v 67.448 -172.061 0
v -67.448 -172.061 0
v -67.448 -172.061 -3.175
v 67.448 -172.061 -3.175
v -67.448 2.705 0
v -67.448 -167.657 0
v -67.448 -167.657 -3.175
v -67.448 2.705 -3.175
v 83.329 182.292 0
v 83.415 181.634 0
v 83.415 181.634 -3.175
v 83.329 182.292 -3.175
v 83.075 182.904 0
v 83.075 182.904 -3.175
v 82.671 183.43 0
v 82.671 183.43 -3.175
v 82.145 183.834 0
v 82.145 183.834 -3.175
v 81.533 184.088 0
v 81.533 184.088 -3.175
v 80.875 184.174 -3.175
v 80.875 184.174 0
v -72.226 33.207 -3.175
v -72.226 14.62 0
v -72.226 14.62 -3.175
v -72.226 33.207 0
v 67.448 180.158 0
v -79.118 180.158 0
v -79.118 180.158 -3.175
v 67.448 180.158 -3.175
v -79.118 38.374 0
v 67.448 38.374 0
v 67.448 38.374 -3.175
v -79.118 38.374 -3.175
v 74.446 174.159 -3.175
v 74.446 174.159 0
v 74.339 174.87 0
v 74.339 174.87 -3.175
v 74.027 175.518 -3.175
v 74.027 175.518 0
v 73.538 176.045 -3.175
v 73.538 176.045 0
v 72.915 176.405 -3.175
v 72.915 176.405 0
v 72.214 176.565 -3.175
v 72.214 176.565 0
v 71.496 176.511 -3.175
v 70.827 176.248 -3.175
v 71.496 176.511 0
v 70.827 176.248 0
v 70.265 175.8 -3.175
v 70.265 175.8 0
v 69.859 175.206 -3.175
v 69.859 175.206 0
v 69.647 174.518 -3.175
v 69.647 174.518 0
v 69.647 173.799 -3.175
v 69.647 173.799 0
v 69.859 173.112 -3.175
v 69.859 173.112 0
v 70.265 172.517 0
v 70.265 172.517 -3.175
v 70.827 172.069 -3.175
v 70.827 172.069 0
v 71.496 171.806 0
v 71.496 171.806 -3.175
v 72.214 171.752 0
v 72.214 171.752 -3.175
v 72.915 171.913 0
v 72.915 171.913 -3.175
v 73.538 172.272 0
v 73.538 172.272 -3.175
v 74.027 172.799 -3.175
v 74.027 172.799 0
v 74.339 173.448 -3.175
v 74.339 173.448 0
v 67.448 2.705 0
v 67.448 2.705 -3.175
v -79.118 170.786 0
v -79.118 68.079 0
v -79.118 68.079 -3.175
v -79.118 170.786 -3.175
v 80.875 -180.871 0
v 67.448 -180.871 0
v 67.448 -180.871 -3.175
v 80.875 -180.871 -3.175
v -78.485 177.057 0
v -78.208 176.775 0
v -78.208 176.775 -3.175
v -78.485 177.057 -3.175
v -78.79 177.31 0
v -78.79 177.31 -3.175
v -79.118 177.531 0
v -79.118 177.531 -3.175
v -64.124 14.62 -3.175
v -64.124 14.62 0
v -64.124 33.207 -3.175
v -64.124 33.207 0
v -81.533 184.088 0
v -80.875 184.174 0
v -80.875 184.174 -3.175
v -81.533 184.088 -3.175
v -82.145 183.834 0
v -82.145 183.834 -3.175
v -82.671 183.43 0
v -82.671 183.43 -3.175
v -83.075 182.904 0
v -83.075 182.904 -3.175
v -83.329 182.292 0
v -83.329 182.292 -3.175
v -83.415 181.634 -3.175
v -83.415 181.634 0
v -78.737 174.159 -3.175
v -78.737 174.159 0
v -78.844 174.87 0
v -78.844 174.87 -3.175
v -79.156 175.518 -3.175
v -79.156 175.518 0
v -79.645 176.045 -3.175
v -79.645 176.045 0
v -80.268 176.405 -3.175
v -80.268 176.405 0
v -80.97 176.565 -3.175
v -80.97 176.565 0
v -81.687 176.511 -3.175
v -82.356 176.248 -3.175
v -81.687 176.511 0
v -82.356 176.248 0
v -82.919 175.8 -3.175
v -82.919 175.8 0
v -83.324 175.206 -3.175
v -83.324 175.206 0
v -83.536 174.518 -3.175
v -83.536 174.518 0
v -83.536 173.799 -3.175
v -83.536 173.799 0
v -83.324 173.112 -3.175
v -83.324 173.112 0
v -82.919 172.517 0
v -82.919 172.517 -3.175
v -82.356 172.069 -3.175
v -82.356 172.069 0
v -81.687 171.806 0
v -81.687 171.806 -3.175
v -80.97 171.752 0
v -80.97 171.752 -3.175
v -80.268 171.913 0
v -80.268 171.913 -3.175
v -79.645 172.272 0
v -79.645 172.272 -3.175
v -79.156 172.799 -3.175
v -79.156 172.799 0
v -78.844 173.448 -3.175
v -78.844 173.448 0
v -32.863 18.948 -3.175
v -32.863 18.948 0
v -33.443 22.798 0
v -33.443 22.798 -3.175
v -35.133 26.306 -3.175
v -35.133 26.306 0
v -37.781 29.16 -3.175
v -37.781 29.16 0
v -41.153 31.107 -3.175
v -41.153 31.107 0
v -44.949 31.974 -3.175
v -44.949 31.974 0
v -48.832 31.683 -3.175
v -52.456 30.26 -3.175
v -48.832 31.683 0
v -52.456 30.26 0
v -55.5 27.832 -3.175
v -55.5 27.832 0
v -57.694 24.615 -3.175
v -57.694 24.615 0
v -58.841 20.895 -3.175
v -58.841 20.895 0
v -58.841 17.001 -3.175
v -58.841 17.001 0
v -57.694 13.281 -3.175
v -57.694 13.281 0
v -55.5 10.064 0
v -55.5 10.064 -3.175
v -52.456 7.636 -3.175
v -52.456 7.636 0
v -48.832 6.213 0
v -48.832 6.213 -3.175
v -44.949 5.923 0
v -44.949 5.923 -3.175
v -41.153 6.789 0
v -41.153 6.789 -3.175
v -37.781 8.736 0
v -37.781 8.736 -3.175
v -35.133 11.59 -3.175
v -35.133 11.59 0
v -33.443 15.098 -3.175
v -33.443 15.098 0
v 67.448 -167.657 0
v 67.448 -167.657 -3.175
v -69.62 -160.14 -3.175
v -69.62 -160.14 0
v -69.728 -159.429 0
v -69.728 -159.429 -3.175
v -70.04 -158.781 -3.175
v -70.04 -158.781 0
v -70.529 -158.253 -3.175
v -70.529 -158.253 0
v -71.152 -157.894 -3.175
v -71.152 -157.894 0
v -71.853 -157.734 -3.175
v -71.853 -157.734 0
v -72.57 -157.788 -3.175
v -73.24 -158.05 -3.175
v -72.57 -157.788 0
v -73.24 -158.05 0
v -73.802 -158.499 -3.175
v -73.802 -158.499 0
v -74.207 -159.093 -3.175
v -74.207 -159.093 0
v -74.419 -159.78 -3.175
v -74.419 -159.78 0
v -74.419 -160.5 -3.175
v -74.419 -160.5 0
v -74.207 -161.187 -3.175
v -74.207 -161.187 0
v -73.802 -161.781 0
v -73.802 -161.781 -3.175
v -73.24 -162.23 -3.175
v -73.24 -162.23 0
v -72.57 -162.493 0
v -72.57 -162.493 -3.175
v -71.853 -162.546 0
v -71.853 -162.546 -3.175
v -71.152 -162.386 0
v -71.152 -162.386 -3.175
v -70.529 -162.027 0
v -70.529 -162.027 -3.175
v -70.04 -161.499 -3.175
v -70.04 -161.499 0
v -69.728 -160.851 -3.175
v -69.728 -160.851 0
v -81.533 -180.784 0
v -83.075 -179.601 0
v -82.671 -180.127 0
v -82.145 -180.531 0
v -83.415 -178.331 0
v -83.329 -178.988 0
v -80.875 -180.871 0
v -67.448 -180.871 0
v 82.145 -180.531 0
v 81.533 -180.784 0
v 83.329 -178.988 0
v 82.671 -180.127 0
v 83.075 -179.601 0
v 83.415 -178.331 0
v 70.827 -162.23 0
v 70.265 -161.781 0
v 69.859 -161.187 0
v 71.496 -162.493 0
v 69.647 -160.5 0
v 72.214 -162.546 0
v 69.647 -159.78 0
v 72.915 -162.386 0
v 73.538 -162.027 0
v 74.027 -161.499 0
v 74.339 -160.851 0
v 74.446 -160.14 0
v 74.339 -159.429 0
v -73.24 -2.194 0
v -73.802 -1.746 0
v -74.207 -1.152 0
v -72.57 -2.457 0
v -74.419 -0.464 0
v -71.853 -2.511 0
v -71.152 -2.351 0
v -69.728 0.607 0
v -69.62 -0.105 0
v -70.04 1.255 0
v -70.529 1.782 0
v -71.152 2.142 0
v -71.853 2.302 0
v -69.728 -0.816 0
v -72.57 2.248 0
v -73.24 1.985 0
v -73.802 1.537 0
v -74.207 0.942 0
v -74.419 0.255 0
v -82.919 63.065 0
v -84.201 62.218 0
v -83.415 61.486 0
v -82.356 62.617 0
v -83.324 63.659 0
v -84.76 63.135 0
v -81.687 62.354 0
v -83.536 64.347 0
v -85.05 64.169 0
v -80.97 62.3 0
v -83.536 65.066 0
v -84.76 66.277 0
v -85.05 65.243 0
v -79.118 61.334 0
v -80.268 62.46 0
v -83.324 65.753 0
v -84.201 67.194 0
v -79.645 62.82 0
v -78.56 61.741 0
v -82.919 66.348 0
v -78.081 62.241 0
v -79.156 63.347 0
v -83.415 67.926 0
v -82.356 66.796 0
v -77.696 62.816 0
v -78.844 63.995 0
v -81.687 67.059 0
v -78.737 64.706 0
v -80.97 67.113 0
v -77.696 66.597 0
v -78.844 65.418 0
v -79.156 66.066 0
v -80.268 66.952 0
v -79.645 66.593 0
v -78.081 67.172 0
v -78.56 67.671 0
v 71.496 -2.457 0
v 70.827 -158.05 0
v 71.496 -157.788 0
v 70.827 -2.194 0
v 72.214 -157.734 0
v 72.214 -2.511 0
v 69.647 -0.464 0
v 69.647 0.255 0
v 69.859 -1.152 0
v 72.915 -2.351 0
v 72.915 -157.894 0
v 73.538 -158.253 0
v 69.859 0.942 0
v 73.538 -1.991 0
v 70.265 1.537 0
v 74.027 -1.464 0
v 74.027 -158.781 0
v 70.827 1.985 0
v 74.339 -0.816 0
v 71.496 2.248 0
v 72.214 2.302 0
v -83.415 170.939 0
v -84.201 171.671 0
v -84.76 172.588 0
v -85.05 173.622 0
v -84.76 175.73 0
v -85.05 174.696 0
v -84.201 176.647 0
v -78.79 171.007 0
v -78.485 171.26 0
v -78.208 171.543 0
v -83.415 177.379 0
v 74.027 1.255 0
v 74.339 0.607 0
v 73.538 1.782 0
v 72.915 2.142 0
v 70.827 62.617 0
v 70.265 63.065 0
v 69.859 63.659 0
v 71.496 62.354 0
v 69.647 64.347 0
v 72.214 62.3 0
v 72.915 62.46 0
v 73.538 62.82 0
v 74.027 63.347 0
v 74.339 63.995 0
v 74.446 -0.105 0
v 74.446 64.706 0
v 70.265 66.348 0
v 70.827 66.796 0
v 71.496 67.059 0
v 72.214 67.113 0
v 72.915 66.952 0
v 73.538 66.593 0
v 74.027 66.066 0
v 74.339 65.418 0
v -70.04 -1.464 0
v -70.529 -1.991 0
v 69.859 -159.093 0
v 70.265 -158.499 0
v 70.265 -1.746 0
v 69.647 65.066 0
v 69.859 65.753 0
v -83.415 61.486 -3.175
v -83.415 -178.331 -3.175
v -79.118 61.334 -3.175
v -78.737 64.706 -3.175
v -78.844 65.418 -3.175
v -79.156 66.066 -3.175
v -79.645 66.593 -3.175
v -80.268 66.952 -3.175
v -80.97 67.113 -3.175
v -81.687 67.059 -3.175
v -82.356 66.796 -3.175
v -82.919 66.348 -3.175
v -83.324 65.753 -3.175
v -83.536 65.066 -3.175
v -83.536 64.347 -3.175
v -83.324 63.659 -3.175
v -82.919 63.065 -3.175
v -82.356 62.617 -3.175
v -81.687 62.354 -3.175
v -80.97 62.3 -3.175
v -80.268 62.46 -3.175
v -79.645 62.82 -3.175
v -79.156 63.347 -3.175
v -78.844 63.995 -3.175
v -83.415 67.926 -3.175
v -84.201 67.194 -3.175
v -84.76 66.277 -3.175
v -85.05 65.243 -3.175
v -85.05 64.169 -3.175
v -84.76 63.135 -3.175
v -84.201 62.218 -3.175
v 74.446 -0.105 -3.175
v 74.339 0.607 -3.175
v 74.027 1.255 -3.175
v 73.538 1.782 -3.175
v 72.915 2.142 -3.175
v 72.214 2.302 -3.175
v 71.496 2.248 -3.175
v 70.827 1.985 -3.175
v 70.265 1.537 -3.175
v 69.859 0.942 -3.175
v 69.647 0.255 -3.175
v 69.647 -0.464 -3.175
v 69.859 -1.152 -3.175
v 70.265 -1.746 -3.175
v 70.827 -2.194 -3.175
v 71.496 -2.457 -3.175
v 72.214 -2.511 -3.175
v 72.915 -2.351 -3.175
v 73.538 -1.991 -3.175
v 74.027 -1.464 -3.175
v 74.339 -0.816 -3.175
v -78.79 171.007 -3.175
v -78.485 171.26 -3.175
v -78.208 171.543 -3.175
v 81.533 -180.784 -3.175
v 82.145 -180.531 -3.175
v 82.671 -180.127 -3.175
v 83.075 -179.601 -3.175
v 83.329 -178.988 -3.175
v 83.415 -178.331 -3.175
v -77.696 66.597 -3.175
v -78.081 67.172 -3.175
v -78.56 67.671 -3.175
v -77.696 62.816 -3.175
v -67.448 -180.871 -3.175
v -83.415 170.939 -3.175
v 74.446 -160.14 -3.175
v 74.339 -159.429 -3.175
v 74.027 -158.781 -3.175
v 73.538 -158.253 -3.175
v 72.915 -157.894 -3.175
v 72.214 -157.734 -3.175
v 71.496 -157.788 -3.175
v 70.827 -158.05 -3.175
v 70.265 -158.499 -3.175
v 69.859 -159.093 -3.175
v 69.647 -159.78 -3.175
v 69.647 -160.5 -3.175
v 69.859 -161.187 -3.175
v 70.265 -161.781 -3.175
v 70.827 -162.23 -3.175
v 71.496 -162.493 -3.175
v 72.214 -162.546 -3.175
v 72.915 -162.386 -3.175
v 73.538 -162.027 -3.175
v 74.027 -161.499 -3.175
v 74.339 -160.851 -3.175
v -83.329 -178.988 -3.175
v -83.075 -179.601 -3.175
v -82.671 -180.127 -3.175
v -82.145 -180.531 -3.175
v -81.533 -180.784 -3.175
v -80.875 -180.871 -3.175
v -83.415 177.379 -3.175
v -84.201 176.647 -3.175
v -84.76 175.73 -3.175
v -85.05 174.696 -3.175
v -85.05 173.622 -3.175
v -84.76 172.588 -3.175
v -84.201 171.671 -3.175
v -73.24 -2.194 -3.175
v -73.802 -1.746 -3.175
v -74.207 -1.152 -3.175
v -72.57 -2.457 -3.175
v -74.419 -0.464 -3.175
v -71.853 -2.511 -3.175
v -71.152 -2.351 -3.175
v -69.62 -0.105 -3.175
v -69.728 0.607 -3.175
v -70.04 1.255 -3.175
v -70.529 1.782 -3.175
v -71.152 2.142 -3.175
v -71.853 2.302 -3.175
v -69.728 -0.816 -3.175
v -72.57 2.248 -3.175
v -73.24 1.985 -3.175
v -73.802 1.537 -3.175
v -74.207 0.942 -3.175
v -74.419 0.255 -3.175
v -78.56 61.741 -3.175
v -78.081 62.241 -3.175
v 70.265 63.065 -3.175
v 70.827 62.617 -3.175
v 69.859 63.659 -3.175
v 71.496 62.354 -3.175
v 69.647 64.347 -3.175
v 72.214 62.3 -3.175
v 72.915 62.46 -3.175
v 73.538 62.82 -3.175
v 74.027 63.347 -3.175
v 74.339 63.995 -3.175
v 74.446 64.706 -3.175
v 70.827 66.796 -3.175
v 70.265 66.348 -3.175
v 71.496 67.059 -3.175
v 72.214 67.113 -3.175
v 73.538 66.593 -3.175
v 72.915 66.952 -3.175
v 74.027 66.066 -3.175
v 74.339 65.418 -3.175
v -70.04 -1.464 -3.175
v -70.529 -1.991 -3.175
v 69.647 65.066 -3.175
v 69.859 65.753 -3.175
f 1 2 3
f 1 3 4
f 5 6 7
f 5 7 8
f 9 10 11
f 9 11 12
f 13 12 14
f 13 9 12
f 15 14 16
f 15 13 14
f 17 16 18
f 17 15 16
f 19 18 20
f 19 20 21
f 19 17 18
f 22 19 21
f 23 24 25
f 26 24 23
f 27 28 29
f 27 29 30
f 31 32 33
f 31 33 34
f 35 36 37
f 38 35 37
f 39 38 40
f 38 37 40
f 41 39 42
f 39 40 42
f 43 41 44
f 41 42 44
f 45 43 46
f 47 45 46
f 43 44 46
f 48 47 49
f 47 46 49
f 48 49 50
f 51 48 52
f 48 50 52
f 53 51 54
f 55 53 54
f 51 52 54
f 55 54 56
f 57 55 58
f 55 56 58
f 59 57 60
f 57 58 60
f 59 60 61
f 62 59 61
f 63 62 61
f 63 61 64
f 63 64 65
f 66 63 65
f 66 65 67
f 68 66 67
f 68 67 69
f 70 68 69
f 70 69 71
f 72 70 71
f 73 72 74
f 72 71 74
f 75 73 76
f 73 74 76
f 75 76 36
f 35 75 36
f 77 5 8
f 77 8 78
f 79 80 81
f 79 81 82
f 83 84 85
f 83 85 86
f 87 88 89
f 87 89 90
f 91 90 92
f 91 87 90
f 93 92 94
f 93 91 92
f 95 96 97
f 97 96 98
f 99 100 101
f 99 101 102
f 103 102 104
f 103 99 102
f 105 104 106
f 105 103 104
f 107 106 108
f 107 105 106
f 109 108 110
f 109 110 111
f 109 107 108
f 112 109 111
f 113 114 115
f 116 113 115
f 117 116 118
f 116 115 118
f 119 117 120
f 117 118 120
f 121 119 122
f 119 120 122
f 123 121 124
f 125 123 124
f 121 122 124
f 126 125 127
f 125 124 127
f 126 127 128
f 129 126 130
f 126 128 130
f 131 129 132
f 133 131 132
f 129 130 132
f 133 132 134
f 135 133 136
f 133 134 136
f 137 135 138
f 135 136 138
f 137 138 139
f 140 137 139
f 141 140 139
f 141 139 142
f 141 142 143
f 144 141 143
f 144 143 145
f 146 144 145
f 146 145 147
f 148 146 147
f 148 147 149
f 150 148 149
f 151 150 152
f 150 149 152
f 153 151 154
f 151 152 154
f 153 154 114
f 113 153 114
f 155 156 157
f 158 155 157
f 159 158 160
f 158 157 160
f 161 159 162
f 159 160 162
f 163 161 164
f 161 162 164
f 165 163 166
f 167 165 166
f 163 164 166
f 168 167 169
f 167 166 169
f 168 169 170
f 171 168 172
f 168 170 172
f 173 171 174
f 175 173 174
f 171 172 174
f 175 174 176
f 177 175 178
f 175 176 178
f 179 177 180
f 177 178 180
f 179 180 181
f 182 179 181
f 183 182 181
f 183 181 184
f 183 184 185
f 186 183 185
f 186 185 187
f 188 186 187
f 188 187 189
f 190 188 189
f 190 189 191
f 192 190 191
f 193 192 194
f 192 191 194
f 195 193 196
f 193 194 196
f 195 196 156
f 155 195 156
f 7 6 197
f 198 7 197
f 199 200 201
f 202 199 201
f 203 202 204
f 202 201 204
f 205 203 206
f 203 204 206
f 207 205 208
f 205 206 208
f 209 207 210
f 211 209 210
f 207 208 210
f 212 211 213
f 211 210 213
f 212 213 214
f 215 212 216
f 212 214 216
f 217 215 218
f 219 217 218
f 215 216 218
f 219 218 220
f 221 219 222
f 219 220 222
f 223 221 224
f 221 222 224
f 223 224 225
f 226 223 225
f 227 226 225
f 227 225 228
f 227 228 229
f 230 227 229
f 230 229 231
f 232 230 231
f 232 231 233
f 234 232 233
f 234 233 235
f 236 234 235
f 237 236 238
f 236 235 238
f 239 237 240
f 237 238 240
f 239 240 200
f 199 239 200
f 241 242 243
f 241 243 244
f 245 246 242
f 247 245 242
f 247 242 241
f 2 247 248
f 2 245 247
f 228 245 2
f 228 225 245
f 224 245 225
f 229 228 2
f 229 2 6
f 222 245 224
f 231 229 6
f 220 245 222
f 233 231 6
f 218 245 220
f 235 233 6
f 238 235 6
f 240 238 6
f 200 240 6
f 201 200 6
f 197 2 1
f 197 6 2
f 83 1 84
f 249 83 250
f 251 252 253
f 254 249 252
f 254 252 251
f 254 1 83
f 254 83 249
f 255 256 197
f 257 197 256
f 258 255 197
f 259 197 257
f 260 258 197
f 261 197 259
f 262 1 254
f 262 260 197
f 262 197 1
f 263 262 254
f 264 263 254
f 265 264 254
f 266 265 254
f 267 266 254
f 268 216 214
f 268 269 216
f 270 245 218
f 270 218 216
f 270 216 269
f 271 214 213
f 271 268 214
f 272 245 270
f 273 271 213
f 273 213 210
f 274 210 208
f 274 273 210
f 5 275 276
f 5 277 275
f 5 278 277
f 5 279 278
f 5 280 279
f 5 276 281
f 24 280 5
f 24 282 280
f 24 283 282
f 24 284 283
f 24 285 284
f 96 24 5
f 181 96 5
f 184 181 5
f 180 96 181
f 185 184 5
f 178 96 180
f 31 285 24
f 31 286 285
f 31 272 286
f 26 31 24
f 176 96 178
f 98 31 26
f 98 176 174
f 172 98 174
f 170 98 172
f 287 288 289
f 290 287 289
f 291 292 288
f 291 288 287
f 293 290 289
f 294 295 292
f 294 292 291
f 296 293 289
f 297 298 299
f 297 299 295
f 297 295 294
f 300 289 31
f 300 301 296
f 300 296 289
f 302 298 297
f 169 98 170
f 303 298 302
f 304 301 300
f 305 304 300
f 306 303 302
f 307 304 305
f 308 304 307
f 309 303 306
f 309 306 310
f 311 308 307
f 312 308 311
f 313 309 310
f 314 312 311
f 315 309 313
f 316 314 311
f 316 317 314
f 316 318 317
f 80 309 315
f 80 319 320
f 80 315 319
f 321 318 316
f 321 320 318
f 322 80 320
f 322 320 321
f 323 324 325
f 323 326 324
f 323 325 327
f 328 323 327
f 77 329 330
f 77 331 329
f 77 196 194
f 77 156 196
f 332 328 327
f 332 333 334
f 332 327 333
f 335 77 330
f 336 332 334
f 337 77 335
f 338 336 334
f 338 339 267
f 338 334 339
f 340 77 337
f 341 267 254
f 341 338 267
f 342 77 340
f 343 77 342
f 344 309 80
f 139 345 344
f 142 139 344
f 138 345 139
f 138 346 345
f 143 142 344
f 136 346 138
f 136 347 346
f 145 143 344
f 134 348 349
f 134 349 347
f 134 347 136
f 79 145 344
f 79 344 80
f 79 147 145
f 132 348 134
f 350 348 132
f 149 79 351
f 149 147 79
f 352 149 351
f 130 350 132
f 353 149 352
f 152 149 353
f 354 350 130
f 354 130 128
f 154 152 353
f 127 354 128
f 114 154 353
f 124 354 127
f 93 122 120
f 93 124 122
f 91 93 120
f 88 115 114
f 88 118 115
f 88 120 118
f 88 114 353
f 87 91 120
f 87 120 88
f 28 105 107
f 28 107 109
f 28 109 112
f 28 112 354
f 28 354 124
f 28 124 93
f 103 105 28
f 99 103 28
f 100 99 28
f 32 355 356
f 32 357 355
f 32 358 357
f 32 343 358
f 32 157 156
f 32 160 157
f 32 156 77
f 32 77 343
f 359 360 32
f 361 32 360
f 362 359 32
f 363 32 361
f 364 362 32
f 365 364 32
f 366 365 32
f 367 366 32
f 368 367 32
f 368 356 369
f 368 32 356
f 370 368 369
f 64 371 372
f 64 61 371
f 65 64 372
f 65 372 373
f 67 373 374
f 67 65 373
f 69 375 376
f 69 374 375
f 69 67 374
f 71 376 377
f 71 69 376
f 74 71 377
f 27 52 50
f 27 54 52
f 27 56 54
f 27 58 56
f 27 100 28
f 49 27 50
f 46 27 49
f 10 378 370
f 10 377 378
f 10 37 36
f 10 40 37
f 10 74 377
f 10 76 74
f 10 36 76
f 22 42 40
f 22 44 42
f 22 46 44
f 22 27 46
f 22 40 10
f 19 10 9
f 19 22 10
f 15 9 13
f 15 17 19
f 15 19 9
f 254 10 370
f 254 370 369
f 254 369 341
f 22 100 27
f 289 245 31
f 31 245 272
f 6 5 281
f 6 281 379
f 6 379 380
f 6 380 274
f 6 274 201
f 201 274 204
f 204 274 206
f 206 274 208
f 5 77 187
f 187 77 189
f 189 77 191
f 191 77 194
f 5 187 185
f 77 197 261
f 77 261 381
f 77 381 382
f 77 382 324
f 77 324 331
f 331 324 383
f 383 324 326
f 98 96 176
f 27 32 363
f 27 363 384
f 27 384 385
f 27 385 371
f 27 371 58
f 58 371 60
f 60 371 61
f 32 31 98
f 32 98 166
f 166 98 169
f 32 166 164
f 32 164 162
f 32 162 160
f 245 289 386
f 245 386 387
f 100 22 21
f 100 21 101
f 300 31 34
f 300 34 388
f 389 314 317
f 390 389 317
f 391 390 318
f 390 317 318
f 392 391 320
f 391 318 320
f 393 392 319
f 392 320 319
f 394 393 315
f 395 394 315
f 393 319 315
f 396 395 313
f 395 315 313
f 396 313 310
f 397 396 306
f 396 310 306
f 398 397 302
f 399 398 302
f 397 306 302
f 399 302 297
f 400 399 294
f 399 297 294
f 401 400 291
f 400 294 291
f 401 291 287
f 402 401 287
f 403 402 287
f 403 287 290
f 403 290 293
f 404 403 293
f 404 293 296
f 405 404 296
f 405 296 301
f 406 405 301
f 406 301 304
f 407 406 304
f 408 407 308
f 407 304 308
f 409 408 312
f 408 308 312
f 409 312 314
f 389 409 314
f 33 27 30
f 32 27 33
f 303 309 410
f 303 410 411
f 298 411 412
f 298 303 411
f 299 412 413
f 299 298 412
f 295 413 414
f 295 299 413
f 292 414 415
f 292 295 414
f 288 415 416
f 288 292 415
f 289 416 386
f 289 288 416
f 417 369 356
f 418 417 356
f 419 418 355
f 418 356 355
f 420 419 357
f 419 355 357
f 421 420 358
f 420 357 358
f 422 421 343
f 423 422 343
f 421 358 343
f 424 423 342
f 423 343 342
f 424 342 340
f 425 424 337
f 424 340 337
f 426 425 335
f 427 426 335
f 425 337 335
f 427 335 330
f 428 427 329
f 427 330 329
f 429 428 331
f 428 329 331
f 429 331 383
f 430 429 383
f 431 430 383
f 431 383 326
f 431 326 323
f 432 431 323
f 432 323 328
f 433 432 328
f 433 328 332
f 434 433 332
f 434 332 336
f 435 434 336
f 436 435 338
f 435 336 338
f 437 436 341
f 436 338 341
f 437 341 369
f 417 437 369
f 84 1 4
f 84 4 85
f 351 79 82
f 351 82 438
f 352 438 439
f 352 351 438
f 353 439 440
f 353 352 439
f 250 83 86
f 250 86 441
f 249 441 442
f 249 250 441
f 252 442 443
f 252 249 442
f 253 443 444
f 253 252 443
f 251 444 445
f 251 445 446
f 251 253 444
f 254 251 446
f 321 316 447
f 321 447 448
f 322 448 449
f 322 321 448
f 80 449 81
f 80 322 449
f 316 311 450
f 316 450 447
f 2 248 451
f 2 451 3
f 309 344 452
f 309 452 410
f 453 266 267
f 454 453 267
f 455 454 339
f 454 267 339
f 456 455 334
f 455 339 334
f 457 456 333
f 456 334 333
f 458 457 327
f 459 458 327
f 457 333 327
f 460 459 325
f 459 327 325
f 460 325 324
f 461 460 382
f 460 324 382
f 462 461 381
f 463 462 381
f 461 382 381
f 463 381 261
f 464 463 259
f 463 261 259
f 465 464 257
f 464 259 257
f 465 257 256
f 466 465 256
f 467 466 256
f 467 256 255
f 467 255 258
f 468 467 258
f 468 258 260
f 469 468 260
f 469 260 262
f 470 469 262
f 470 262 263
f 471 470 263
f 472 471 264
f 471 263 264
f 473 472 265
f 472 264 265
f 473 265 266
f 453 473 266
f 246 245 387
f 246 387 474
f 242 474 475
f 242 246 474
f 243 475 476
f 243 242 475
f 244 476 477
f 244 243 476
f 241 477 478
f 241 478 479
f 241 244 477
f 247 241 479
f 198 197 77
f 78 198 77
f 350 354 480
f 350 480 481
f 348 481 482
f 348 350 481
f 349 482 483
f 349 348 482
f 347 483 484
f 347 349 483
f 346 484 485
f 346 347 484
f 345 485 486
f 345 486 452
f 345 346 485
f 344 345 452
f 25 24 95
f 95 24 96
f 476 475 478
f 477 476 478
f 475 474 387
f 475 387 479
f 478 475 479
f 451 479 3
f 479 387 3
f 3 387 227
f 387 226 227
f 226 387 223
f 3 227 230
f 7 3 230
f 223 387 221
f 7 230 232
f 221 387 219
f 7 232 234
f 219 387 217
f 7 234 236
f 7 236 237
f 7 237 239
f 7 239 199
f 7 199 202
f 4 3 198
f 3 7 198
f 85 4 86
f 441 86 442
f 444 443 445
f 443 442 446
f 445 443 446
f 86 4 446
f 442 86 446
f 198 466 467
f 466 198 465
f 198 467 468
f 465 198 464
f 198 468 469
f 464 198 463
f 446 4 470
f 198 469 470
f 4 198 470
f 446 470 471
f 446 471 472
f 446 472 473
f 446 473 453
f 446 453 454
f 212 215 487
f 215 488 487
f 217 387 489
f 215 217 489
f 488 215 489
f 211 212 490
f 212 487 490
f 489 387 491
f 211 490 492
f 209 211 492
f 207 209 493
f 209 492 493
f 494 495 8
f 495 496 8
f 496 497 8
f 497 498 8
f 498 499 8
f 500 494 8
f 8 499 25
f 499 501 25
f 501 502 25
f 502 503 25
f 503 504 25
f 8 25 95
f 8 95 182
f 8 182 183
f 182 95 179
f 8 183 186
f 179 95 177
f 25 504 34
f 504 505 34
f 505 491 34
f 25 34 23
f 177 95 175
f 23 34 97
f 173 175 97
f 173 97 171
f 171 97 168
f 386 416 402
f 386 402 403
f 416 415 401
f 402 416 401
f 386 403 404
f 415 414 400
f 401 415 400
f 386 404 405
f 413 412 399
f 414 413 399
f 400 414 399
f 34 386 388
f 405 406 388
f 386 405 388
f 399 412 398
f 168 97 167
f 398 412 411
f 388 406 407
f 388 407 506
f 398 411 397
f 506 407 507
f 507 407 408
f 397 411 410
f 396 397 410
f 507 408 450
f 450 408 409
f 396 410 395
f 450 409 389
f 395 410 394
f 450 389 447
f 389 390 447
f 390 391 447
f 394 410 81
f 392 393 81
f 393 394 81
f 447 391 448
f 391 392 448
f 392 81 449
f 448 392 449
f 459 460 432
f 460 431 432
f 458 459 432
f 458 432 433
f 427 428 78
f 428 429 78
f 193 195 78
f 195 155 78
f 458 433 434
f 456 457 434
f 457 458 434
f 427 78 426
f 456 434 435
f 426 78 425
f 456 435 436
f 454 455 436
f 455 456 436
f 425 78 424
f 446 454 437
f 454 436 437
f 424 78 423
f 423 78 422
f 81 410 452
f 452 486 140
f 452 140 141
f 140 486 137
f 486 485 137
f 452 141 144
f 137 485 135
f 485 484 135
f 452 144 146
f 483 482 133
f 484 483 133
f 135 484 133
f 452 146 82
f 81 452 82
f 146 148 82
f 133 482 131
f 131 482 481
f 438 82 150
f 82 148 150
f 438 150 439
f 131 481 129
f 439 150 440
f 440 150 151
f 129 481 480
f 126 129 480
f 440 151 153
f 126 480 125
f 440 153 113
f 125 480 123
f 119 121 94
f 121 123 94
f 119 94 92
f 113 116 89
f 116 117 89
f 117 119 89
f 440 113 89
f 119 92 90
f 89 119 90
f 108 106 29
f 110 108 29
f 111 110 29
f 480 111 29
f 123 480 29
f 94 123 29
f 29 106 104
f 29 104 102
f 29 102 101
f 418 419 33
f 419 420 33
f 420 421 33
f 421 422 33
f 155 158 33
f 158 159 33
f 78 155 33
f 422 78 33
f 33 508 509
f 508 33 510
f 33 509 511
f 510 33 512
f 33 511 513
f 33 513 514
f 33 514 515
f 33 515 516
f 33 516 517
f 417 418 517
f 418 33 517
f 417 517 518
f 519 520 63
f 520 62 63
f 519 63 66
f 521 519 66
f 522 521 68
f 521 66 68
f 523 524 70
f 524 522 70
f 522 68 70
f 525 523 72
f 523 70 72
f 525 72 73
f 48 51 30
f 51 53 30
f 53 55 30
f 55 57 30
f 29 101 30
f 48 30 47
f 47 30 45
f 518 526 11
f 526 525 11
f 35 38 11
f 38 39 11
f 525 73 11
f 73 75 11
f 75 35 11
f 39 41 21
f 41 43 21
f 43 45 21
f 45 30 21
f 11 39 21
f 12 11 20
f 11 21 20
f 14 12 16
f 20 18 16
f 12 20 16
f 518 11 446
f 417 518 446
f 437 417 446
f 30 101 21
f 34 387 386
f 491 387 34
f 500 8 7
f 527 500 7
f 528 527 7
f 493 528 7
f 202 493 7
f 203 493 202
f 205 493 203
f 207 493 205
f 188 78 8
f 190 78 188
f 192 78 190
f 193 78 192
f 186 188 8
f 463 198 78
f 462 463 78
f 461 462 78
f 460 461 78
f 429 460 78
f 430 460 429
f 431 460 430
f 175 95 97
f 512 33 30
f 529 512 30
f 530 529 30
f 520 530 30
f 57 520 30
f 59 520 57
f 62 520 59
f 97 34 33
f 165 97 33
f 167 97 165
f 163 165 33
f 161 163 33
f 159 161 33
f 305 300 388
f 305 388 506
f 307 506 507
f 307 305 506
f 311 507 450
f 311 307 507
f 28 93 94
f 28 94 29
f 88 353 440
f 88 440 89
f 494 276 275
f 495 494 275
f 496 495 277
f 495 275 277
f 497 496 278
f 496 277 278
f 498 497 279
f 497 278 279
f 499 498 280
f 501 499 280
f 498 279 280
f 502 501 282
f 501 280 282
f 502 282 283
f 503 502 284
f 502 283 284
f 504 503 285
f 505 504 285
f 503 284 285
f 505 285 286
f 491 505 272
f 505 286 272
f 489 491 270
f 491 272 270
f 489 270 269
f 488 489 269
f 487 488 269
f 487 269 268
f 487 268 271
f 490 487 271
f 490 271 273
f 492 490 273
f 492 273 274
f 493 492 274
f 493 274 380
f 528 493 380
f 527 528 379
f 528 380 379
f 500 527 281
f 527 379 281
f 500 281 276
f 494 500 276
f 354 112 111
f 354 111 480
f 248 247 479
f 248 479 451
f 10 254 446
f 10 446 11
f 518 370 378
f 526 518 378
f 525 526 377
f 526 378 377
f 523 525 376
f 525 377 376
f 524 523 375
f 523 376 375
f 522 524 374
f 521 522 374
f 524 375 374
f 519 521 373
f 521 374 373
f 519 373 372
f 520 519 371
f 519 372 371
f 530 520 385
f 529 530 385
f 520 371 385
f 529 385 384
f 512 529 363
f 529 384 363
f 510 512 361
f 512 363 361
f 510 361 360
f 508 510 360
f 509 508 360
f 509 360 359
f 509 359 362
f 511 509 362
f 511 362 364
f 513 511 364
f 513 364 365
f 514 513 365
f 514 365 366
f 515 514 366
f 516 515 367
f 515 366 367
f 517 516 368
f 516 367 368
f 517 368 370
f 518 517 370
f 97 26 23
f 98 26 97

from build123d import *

# Parameters (mm, degrees)
SKETCH1_R          = 13.062040361
SKETCH1_R_2        = 2.413
SKETCH1_W          = 134.896048872
SKETCH1_H          = 170.361865006
SKETCH1_W_2        = 8.101943593
SKETCH1_H_2        = 18.586811772
BASE_EXTRUDE_DEPTH = 3.175


with BuildPart() as part:
    # Sketch1 → Base-Extrude (new body)
    with BuildSketch(Plane.XY):
        with BuildLine():
            Line((67.448024436, -180.870824712), (80.875311853, -180.870824712))
            ThreePointArc((80.875311853, -180.870824712), (82.671363078, -180.126875936), (83.415311853, -178.330824712))
            Line((83.415311853, -178.330824712), (83.415311853, 181.634401419))
            ThreePointArc((83.415311853, 181.634401419), (82.671363078, 183.430452643), (80.875311853, 184.174401419))
            Line((80.875311853, 184.174401419), (67.448024436, 184.174401419))
            Line((67.448024436, 184.174401419), (-80.875311853, 184.174401419))
            ThreePointArc((-80.875311853, 184.174401419), (-82.671363078, 183.430452643), (-83.415311853, 181.634401419))
            Line((-83.415311853, 181.634401419), (-83.415311853, 177.378670652))
            ThreePointArc((-83.415311853, 177.378670652), (-85.086906608, 174.158747039), (-83.415311853, 170.938823426))
            Line((-83.415311853, 170.938823426), (-83.415311853, 67.926183644))
            ThreePointArc((-83.415311853, 67.926183644), (-85.086906608, 64.706260031), (-83.415311853, 61.486336418))
            Line((-83.415311853, 61.486336418), (-83.415311853, -178.330824712))
            ThreePointArc((-83.415311853, -178.330824712), (-82.671363078, -180.126875936), (-80.875311853, -180.870824712))
            Line((-80.875311853, -180.870824712), (-67.448024436, -180.870824712))
            Line((-67.448024436, -180.870824712), (-67.448024436, -172.061286826))
            Line((-67.448024436, -172.061286826), (67.448024436, -172.061286826))
            Line((67.448024436, -172.061286826), (67.448024436, -180.870824712))
        make_face()
        with Locations((-45.925033829, 18.948035519)):
            Circle(SKETCH1_R, mode=Mode.SUBTRACT)
        with Locations((-81.149906608, 174.158747039)):
            Circle(SKETCH1_R_2, mode=Mode.SUBTRACT)
        with Locations((-72.033370308, -0.104595883)):
            Circle(SKETCH1_R_2, mode=Mode.SUBTRACT)
        with Locations((-72.033370308, -160.140032971)):
            Circle(SKETCH1_R_2, mode=Mode.SUBTRACT)
        with Locations((72.033370308, -160.140032971)):
            Circle(SKETCH1_R_2, mode=Mode.SUBTRACT)
        with Locations((72.033370308, 174.158747039)):
            Circle(SKETCH1_R_2, mode=Mode.SUBTRACT)
        with Locations((72.033370308, 64.706260031)):
            Circle(SKETCH1_R_2, mode=Mode.SUBTRACT)
        with Locations((72.033370308, -0.104595883)):
            Circle(SKETCH1_R_2, mode=Mode.SUBTRACT)
        with Locations((-81.149906608, 64.706260031)):
            Circle(SKETCH1_R_2, mode=Mode.SUBTRACT)
        with BuildLine():
            Line((67.448024436, 180.158408435), (67.448024436, 38.374253759))
            Line((67.448024436, 38.374253759), (-79.118458404, 38.374253759))
            Line((-79.118458404, 38.374253759), (-79.118458404, 61.333844399))
            ThreePointArc((-79.118458404, 61.333844399), (-78.309050002, 61.980548611), (-77.696370086, 62.816007537))
            Line((-77.696370086, 62.816007537), (-77.696370086, 66.596512525))
            ThreePointArc((-77.696370086, 66.596512525), (-78.309050002, 67.431971452), (-79.118458404, 68.078675663))
            Line((-79.118458404, 68.078675663), (-79.118458404, 170.786331407))
            ThreePointArc((-79.118458404, 170.786331407), (-78.634491656, 171.130107638), (-78.207715157, 171.542742745))
            Line((-78.207715157, 171.542742745), (-78.207715157, 176.774751333))
            ThreePointArc((-78.207715157, 176.774751333), (-78.634491656, 177.18738644), (-79.118458404, 177.531162671))
            Line((-79.118458404, 177.531162671), (-79.118458404, 180.158408435))
            Line((-79.118458404, 180.158408435), (67.448024436, 180.158408435))
        make_face(mode=Mode.SUBTRACT)
        with Locations((0, -82.475585381)):
            Rectangle(SKETCH1_W, SKETCH1_H, mode=Mode.SUBTRACT)
        with Locations((-68.175247928, 23.913375939)):
            Rectangle(SKETCH1_W_2, SKETCH1_H_2, mode=Mode.SUBTRACT)
    extrude(amount=-BASE_EXTRUDE_DEPTH)


solid = part.part
